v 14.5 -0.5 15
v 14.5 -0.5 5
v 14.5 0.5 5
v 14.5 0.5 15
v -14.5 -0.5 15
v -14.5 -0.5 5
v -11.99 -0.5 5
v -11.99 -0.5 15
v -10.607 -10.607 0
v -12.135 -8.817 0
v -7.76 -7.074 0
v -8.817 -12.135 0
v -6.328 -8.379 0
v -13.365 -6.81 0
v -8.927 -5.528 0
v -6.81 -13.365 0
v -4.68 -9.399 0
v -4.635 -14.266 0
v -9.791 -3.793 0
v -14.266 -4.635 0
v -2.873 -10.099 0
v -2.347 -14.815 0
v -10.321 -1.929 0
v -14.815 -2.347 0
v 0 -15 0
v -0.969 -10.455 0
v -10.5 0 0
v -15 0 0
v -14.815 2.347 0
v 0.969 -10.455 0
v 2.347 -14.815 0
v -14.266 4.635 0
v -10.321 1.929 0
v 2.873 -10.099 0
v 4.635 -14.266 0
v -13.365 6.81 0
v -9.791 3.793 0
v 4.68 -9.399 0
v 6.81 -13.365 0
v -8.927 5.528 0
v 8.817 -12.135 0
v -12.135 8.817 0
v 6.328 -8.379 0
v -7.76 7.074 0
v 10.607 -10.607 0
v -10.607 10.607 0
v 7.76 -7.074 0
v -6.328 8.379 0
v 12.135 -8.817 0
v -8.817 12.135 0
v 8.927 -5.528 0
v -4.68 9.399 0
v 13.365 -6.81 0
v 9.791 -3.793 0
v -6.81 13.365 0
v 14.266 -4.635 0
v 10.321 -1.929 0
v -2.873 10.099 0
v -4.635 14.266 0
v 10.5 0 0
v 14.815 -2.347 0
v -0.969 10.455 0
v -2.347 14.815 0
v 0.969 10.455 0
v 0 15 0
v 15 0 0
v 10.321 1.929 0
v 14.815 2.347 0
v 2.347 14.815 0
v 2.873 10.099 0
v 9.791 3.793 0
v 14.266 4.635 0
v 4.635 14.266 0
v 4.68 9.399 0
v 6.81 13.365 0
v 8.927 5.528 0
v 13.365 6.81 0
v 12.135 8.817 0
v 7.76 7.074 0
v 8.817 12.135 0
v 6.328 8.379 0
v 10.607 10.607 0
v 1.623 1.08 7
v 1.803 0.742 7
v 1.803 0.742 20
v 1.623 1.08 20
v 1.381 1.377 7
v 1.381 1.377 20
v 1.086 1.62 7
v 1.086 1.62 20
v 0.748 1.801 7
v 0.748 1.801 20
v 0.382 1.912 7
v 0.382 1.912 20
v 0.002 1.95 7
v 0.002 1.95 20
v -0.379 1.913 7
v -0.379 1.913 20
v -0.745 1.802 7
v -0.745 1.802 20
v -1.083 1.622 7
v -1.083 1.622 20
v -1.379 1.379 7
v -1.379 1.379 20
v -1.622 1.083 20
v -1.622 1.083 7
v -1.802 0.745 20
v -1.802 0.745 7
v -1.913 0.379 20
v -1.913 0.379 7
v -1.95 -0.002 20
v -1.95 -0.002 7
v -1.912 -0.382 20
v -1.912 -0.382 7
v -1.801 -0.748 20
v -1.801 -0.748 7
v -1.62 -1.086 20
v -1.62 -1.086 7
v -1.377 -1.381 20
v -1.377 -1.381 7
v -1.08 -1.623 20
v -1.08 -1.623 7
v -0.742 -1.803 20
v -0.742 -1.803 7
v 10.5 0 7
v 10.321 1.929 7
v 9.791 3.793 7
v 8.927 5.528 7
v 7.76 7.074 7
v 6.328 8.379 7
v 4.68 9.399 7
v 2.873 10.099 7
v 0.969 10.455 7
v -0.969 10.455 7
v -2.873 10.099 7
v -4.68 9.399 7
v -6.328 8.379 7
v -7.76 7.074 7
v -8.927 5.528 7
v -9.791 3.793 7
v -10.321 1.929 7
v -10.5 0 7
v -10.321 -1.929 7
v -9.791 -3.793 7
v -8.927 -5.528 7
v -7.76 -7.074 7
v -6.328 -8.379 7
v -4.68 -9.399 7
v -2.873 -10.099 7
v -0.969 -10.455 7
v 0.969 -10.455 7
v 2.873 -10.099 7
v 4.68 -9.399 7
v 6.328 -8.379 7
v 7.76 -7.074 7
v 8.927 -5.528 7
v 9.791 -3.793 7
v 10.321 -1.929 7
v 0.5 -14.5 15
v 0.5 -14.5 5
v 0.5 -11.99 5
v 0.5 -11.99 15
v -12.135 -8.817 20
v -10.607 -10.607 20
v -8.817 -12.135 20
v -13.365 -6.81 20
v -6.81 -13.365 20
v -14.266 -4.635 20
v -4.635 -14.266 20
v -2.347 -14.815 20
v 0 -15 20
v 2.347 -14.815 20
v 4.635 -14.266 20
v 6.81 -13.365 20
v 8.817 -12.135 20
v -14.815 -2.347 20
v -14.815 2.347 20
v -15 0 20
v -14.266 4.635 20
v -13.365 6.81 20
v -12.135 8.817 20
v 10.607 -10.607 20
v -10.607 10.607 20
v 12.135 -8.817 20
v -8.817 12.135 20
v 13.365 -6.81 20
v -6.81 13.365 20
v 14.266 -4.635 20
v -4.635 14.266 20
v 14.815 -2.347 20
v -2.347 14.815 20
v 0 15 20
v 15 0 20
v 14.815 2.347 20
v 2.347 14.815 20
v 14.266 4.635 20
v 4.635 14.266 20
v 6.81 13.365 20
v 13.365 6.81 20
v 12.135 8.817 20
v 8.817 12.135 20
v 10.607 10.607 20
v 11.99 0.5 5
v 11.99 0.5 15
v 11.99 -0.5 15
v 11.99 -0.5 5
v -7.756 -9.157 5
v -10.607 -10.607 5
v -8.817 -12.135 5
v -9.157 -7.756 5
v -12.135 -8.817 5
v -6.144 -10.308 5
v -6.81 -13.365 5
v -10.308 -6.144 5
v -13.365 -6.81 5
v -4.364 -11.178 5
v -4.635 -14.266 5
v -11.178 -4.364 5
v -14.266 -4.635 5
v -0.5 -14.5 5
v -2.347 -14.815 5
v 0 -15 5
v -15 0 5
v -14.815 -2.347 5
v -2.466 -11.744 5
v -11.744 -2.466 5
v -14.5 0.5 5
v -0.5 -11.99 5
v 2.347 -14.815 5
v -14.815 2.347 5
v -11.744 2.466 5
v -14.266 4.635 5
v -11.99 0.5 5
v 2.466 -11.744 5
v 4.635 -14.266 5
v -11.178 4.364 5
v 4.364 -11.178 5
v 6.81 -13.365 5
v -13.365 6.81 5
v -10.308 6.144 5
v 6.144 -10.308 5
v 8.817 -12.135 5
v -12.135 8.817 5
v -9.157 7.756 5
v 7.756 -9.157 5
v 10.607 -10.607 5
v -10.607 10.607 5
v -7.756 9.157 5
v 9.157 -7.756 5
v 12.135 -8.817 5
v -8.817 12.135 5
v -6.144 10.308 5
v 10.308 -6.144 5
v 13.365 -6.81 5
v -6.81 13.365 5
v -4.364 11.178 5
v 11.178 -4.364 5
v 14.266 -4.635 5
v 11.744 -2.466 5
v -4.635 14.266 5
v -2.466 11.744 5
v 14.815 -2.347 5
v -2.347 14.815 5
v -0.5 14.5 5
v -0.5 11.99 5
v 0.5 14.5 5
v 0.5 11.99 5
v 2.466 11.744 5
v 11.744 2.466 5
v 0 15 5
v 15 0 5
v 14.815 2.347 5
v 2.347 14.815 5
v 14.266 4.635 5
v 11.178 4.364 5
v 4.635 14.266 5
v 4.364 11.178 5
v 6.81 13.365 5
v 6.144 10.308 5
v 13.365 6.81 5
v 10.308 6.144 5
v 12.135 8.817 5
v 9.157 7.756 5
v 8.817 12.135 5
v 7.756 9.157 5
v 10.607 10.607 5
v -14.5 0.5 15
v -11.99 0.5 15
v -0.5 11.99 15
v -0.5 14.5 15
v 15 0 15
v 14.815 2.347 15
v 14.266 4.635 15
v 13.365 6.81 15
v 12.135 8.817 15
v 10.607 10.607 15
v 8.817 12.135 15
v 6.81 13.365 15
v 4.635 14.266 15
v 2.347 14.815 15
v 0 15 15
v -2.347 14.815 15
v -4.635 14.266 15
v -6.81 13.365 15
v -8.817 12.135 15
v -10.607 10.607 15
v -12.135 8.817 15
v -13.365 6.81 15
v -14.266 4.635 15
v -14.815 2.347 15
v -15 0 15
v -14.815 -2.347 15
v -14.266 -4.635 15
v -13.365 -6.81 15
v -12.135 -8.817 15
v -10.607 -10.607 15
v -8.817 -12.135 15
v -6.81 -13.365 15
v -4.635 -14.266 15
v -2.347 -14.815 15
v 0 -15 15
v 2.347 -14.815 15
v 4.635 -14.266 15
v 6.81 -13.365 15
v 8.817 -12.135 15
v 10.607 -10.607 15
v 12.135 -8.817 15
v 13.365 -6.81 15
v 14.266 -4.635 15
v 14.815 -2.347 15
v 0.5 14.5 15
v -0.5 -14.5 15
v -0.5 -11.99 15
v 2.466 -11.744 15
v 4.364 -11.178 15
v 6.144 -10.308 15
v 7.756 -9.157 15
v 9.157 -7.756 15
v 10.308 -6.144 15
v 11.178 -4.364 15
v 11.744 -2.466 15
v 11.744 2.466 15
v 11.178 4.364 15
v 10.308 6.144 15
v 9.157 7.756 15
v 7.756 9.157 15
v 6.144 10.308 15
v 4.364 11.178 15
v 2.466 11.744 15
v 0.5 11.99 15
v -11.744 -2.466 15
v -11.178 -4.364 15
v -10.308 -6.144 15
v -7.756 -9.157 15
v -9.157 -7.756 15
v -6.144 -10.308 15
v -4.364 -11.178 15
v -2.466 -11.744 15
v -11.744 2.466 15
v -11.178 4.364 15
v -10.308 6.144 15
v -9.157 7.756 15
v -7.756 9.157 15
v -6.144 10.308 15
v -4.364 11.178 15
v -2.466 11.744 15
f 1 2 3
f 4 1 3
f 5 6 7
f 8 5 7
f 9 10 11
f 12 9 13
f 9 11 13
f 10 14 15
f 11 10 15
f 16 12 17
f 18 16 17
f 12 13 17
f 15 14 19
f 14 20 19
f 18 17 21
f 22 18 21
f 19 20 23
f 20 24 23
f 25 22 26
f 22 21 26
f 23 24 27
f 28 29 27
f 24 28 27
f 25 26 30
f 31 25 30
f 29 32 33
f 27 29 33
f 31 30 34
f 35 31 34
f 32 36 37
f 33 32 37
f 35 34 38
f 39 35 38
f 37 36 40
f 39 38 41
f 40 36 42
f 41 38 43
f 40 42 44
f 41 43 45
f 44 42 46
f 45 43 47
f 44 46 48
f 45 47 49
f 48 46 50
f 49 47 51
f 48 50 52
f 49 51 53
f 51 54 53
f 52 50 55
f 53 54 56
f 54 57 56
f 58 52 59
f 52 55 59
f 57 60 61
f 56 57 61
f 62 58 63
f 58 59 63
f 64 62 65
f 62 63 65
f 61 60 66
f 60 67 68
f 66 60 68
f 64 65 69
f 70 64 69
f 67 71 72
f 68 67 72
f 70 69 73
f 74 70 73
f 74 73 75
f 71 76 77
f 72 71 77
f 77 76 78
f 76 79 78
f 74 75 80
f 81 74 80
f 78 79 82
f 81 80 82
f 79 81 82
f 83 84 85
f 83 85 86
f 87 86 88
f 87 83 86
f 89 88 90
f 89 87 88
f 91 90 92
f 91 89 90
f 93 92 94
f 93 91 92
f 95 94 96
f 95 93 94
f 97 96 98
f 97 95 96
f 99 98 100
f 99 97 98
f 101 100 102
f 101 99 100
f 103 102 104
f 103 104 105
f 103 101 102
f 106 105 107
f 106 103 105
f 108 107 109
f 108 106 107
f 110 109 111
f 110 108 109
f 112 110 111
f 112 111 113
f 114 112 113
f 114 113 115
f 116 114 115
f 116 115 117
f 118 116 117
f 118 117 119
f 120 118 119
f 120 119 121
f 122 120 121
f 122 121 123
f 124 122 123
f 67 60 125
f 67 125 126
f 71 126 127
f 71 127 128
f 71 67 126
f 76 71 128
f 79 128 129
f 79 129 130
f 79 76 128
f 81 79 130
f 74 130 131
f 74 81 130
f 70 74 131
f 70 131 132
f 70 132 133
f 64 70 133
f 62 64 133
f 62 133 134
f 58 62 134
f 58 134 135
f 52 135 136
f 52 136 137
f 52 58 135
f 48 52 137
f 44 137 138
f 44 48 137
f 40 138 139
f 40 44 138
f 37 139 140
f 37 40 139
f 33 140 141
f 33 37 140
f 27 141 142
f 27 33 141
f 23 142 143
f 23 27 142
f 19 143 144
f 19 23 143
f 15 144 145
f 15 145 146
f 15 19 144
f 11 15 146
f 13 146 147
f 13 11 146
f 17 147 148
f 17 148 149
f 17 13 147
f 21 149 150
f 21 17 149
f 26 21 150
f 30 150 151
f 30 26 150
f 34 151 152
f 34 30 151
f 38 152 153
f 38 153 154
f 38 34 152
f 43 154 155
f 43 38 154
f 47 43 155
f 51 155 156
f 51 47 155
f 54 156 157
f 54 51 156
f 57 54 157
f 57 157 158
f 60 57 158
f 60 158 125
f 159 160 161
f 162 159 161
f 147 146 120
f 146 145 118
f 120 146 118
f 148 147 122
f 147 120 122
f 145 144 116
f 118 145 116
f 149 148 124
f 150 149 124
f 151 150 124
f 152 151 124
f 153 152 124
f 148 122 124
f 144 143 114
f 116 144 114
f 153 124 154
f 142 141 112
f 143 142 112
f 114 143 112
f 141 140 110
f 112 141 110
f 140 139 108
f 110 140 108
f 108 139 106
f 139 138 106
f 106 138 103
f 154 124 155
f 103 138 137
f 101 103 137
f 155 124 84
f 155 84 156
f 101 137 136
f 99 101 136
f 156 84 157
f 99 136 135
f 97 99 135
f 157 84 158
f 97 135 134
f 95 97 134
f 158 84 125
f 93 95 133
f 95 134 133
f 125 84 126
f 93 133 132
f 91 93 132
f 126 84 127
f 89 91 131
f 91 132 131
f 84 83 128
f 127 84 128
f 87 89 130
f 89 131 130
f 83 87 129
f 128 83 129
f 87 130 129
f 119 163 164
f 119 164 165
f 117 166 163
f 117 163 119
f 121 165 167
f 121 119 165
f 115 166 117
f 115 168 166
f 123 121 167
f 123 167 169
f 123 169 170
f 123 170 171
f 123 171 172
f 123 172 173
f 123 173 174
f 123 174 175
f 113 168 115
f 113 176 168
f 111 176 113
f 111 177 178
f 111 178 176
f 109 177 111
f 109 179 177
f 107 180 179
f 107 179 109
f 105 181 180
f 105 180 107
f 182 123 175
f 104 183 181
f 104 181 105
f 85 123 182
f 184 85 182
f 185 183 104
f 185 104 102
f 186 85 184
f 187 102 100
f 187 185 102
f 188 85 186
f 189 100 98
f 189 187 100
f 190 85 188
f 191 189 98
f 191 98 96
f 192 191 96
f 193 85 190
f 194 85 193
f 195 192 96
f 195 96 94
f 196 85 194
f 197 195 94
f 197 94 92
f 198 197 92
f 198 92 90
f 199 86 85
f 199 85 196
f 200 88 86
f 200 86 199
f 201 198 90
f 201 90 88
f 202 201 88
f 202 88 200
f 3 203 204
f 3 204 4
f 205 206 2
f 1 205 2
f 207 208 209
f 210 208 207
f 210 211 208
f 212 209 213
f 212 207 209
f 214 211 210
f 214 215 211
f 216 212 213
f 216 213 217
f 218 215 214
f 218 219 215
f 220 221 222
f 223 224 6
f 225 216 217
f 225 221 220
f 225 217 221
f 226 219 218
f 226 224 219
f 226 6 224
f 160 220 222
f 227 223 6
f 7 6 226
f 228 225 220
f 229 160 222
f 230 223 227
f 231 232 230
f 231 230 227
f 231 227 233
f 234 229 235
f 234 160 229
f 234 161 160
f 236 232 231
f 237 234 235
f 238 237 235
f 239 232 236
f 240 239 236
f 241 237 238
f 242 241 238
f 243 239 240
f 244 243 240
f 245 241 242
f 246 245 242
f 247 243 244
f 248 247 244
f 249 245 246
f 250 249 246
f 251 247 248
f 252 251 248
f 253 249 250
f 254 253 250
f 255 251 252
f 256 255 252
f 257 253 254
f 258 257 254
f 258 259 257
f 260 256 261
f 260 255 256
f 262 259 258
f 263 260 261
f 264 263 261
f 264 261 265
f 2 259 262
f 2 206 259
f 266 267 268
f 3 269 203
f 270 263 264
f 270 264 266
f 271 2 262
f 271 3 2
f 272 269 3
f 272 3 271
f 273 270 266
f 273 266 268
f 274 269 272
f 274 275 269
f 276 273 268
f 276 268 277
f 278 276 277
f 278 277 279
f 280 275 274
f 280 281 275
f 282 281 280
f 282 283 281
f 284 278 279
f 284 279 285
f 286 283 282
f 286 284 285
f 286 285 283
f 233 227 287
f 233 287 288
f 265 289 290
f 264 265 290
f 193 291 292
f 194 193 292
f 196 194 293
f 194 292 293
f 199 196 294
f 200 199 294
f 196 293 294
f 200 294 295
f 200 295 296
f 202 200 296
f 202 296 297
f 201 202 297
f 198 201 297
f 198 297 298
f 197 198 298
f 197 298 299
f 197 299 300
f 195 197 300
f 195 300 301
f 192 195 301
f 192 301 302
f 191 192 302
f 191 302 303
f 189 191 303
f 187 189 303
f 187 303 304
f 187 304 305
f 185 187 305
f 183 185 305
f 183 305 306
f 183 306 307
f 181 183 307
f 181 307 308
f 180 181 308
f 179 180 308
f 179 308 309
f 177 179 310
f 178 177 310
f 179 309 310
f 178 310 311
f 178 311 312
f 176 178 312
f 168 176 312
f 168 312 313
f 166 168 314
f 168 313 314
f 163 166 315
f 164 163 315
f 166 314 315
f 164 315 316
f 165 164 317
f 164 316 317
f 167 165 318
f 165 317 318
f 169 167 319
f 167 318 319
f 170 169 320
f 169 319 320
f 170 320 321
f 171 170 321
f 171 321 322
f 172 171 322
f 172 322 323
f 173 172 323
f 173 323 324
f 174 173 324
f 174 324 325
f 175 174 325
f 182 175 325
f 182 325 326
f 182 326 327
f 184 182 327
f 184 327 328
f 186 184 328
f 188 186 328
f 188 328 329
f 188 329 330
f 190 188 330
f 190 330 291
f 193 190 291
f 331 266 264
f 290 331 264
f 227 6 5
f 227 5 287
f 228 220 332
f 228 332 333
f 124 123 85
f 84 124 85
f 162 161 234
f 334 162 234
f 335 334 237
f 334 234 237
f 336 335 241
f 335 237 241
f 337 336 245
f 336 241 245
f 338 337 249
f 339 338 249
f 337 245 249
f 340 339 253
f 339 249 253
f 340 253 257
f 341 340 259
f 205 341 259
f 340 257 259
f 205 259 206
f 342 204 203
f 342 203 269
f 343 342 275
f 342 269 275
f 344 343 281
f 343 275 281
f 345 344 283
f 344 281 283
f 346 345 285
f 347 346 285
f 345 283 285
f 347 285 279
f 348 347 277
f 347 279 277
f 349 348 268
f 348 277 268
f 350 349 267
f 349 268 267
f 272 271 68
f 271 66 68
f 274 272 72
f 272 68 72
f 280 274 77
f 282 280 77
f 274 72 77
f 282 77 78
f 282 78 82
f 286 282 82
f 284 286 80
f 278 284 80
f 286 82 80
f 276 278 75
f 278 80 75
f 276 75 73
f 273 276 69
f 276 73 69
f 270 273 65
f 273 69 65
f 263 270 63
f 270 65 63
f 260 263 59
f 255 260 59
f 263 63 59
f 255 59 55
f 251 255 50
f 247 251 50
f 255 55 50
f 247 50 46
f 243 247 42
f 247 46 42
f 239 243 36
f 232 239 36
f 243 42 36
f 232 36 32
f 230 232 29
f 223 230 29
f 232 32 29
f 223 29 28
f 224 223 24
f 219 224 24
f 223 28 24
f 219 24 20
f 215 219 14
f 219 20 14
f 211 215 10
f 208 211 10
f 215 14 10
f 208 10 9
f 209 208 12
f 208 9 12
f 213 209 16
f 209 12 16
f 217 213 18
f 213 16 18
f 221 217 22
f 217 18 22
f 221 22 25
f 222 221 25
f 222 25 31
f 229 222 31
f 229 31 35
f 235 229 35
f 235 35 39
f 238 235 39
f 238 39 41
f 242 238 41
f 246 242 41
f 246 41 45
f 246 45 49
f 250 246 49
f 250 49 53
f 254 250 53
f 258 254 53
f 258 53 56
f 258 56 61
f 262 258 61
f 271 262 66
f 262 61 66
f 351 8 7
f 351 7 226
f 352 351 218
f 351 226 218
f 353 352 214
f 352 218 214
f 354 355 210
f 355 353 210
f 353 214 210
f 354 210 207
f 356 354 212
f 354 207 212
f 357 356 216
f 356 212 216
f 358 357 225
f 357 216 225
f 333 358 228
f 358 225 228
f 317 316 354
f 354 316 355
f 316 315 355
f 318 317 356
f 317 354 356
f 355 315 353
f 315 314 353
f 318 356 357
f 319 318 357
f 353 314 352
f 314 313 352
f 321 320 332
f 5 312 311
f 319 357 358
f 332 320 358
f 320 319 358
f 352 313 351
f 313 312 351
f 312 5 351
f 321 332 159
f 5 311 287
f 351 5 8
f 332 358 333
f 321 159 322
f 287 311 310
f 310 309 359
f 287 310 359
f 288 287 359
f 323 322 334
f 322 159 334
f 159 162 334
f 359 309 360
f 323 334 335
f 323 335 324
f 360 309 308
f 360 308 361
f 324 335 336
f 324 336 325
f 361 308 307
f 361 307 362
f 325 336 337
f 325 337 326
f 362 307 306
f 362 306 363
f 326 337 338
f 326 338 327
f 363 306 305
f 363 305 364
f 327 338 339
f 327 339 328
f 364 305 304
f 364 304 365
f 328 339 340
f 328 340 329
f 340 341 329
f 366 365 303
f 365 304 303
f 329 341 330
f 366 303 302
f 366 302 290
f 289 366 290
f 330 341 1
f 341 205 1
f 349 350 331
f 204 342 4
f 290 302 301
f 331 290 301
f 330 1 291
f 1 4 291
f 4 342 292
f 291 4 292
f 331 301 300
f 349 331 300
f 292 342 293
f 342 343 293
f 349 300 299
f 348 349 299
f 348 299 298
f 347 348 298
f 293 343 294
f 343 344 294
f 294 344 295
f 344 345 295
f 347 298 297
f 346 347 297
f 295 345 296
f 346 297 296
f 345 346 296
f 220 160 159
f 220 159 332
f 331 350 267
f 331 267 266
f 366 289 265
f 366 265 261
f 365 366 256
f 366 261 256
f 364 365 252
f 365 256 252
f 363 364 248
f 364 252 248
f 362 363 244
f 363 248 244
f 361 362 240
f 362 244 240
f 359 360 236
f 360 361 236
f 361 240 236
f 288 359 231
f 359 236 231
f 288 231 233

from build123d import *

# Parameters (mm, degrees)
BOX006_W                    = 10
BOX006_H                    = 10
BOX006_DEPTH                = 20
CYLINDER016_R               = 1.95
CYLINDER016_DEPTH           = 20
CUT001_PLACEMENT_ANGLE      = 315
CYLINDER015_R               = 10.5
CYLINDER015_DEPTH           = 7
CYLINDER010_R               = 12
CYLINDER010_DEPTH           = 20
CYLINDER011_R               = 15
CYLINDER011_DEPTH           = 3.5
CYLINDER012_R               = 15
CYLINDER012_DEPTH           = 1.5
CYLINDER013_R               = 15
CYLINDER013_DEPTH           = 1.5
CYLINDER014_R               = 15
CYLINDER014_DEPTH           = 3.5
BOX004_W                    = 29
BOX004_H                    = 1
BOX004_DEPTH                = 10
BOX005_W                    = 29
BOX005_H                    = 1
BOX005_DEPTH                = 10
COMPOUND002_PLACEMENT_ANGLE = 90


with BuildPart() as cube006:
    # Box006 → Box006 (new body)
    with BuildSketch(Plane(origin=(0.75, -5, 0), x_dir=(1, 0, 0), z_dir=(0, 0, 1))):
        with Locations((5, 5)):
            Rectangle(BOX006_W, BOX006_H)
    extrude(amount=BOX006_DEPTH)


with BuildPart() as n20motorshaft:
    # Cylinder016 → Cylinder016 (new body)
    with BuildSketch(Plane.XY):
        Circle(CYLINDER016_R)
    extrude(amount=CYLINDER016_DEPTH)

    # Cut001: cut Cube006
    add(cube006.part, mode=Mode.SUBTRACT)


with BuildPart() as n20motorshaft_1:
    # Cut001 placement: moved
    add(n20motorshaft.part.rotate(Axis((0, 0, 0), (0, 0, 1)), CUT001_PLACEMENT_ANGLE))


with BuildPart() as cylinder015:
    # Cylinder015 → Cylinder015 (new body)
    with BuildSketch(Plane.XY):
        Circle(CYLINDER015_R)
    extrude(amount=CYLINDER015_DEPTH)


with BuildPart() as cylinder010:
    # Cylinder010 → Cylinder010 (new body)
    with BuildSketch(Plane.XY):
        Circle(CYLINDER010_R)
    extrude(amount=CYLINDER010_DEPTH)


with BuildPart() as cylinder011:
    # Cylinder011 → Cylinder011 (new body)
    with BuildSketch(Plane.XY):
        Circle(CYLINDER011_R)
    extrude(amount=CYLINDER011_DEPTH)


with BuildPart() as cylinder012:
    # Cylinder012 → Cylinder012 (new body)
    with BuildSketch(Plane.XY.offset(3.5)):
        Circle(CYLINDER012_R)
    extrude(amount=CYLINDER012_DEPTH)


with BuildPart() as cylinder013:
    # Cylinder013 → Cylinder013 (new body)
    with BuildSketch(Plane.XY.offset(18.5)):
        Circle(CYLINDER013_R)
    extrude(amount=CYLINDER013_DEPTH)


with BuildPart() as cylinder014:
    # Cylinder014 → Cylinder014 (new body)
    with BuildSketch(Plane.XY.offset(15)):
        Circle(CYLINDER014_R)
    extrude(amount=CYLINDER014_DEPTH)


with BuildPart() as cube004:
    # Box004 → Box004 (new body)
    with BuildSketch(Plane(origin=(-14.5, -0.5, 5), x_dir=(1, 0, 0), z_dir=(0, 0, 1))):
        with Locations((14.5, 0.5)):
            Rectangle(BOX004_W, BOX004_H)
    extrude(amount=BOX004_DEPTH)


with BuildPart() as pressfitn20:
    # Box005 → Box005 (new body)
    with BuildSketch(Plane(origin=(-14.5, -0.5, 5), x_dir=(1, 0, 0), z_dir=(0, 0, 1))):
        with Locations((14.5, 0.5)):
            Rectangle(BOX005_W, BOX005_H)
    extrude(amount=BOX005_DEPTH)


with BuildPart() as pressfitn20_1:
    # Compound002 placement: moved
    add(pressfitn20.part.rotate(Axis((0, 0, 0), (0, 0, 1)), COMPOUND002_PLACEMENT_ANGLE))

    # Fusion002: union Cylinder010, Cylinder011, Cylinder012, Cylinder013, Cylinder014, Cube004
    add(cylinder010.part)
    add(cylinder011.part)
    add(cylinder012.part)
    add(cylinder013.part)
    add(cylinder014.part)
    add(cube004.part)

    # Cut: cut Cylinder015
    add(cylinder015.part, mode=Mode.SUBTRACT)

    # Cut002: cut N20MotorShaft
    add(n20motorshaft_1.part, mode=Mode.SUBTRACT)


solid = pressfitn20_1.part
